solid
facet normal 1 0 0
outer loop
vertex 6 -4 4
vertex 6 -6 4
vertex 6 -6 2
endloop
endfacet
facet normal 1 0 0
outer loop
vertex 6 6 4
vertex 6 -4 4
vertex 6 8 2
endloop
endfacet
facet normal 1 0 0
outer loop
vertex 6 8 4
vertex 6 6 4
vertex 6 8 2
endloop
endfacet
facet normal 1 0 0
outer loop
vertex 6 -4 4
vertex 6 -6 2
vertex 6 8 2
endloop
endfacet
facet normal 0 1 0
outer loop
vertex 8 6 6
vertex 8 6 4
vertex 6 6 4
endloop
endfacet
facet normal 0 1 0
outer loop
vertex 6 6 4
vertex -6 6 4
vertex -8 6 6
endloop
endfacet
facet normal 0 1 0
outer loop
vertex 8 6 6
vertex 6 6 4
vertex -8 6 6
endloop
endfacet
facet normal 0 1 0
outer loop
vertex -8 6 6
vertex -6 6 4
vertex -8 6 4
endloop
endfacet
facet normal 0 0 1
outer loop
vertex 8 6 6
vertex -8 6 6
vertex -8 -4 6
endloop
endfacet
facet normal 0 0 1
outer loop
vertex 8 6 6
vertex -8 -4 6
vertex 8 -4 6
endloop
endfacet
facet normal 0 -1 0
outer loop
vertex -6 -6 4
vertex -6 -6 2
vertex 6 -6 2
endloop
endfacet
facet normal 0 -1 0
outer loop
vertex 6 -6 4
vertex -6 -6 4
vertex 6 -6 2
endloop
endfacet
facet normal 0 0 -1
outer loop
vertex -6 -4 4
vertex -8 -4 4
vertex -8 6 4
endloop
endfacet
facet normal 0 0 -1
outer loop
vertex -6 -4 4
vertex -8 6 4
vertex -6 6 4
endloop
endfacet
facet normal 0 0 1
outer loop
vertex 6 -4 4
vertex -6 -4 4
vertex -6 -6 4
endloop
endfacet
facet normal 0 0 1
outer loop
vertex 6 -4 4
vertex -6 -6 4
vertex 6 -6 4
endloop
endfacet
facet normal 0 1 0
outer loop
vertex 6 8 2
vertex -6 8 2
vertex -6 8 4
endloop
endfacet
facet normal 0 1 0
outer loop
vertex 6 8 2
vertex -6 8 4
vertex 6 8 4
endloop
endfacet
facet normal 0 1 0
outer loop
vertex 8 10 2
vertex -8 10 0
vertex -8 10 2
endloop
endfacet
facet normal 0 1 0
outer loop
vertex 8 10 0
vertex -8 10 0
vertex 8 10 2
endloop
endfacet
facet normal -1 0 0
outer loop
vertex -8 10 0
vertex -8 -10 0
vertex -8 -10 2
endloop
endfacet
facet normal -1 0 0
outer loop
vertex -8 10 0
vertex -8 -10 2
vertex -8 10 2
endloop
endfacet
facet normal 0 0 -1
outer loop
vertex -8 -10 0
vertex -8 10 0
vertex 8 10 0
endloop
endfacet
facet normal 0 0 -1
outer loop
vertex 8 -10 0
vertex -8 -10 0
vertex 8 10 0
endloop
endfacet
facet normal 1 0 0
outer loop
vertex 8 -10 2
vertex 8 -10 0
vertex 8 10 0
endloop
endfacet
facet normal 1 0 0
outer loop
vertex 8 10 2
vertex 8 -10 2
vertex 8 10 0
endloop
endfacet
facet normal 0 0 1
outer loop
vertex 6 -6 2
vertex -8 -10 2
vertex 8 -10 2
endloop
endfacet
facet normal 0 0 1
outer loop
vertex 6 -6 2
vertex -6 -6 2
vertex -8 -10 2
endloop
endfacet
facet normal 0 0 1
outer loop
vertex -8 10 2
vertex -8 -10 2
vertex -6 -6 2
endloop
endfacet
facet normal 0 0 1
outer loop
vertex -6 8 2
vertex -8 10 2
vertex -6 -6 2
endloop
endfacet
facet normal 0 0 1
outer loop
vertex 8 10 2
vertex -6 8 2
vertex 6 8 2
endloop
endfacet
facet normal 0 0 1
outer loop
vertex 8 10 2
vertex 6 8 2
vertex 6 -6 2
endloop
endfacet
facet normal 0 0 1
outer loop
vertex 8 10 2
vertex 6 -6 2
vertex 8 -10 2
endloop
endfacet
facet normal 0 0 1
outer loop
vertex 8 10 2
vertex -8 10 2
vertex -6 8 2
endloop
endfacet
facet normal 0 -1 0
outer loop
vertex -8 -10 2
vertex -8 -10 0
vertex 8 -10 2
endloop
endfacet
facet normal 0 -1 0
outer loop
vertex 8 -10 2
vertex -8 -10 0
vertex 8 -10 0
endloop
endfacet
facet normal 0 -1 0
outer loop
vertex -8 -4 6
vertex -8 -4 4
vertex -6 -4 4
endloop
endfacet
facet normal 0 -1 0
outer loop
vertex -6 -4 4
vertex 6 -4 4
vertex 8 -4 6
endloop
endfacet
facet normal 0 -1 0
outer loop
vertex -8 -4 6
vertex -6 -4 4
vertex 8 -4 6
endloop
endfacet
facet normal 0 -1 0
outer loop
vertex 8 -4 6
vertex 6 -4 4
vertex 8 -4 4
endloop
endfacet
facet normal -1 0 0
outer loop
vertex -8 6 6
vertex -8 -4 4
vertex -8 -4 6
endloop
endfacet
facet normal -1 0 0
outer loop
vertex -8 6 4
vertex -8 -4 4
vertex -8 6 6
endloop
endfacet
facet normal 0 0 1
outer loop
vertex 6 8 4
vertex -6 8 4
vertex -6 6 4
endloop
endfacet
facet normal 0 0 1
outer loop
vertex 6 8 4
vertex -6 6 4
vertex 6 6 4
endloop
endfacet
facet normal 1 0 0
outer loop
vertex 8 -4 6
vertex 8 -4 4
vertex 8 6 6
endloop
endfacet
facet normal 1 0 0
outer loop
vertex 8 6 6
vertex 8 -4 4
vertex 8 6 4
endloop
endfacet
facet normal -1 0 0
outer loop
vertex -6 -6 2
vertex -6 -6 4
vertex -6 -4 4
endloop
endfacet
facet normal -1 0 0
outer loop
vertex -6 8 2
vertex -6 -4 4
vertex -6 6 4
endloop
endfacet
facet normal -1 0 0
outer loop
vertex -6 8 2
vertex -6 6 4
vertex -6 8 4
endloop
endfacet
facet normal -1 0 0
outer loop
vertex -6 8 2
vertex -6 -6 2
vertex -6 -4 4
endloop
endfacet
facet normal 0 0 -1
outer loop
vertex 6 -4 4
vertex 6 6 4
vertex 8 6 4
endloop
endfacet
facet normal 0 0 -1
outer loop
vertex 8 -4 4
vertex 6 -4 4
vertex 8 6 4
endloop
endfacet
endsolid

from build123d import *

# Parameters (mm, degrees)
F1_W     = 16
F1_H     = 20
F2_DEPTH = 2
F3_W     = 12
F3_H     = 14
F4_DEPTH = 2
F5_W     = 2
F5_H     = 10
F5_W_2   = 12
F6_DEPTH = 2


with BuildPart() as f2:
    # F1 (on Top) → F2 (new body)
    with BuildSketch(Plane.XY):
        Rectangle(F1_W, F1_H)
    extrude(amount=F2_DEPTH)

    # F3 (on face) → F4 (join)
    with BuildSketch(Plane.XY.offset(2)):
        with Locations((0, 1)):
            Rectangle(F3_W, F3_H)
    extrude(amount=F4_DEPTH)

    # F5 (on face) → F6 (join)
    with BuildSketch(Plane.XY.offset(4)):
        with Locations((-7, 1)):
            Rectangle(F5_W, F5_H)
        with Locations((0, 1)):
            Rectangle(F5_W_2, F5_H)
        with Locations((7, 1)):
            Rectangle(F5_W, F5_H)
    extrude(amount=F6_DEPTH)


solid = f2.part
